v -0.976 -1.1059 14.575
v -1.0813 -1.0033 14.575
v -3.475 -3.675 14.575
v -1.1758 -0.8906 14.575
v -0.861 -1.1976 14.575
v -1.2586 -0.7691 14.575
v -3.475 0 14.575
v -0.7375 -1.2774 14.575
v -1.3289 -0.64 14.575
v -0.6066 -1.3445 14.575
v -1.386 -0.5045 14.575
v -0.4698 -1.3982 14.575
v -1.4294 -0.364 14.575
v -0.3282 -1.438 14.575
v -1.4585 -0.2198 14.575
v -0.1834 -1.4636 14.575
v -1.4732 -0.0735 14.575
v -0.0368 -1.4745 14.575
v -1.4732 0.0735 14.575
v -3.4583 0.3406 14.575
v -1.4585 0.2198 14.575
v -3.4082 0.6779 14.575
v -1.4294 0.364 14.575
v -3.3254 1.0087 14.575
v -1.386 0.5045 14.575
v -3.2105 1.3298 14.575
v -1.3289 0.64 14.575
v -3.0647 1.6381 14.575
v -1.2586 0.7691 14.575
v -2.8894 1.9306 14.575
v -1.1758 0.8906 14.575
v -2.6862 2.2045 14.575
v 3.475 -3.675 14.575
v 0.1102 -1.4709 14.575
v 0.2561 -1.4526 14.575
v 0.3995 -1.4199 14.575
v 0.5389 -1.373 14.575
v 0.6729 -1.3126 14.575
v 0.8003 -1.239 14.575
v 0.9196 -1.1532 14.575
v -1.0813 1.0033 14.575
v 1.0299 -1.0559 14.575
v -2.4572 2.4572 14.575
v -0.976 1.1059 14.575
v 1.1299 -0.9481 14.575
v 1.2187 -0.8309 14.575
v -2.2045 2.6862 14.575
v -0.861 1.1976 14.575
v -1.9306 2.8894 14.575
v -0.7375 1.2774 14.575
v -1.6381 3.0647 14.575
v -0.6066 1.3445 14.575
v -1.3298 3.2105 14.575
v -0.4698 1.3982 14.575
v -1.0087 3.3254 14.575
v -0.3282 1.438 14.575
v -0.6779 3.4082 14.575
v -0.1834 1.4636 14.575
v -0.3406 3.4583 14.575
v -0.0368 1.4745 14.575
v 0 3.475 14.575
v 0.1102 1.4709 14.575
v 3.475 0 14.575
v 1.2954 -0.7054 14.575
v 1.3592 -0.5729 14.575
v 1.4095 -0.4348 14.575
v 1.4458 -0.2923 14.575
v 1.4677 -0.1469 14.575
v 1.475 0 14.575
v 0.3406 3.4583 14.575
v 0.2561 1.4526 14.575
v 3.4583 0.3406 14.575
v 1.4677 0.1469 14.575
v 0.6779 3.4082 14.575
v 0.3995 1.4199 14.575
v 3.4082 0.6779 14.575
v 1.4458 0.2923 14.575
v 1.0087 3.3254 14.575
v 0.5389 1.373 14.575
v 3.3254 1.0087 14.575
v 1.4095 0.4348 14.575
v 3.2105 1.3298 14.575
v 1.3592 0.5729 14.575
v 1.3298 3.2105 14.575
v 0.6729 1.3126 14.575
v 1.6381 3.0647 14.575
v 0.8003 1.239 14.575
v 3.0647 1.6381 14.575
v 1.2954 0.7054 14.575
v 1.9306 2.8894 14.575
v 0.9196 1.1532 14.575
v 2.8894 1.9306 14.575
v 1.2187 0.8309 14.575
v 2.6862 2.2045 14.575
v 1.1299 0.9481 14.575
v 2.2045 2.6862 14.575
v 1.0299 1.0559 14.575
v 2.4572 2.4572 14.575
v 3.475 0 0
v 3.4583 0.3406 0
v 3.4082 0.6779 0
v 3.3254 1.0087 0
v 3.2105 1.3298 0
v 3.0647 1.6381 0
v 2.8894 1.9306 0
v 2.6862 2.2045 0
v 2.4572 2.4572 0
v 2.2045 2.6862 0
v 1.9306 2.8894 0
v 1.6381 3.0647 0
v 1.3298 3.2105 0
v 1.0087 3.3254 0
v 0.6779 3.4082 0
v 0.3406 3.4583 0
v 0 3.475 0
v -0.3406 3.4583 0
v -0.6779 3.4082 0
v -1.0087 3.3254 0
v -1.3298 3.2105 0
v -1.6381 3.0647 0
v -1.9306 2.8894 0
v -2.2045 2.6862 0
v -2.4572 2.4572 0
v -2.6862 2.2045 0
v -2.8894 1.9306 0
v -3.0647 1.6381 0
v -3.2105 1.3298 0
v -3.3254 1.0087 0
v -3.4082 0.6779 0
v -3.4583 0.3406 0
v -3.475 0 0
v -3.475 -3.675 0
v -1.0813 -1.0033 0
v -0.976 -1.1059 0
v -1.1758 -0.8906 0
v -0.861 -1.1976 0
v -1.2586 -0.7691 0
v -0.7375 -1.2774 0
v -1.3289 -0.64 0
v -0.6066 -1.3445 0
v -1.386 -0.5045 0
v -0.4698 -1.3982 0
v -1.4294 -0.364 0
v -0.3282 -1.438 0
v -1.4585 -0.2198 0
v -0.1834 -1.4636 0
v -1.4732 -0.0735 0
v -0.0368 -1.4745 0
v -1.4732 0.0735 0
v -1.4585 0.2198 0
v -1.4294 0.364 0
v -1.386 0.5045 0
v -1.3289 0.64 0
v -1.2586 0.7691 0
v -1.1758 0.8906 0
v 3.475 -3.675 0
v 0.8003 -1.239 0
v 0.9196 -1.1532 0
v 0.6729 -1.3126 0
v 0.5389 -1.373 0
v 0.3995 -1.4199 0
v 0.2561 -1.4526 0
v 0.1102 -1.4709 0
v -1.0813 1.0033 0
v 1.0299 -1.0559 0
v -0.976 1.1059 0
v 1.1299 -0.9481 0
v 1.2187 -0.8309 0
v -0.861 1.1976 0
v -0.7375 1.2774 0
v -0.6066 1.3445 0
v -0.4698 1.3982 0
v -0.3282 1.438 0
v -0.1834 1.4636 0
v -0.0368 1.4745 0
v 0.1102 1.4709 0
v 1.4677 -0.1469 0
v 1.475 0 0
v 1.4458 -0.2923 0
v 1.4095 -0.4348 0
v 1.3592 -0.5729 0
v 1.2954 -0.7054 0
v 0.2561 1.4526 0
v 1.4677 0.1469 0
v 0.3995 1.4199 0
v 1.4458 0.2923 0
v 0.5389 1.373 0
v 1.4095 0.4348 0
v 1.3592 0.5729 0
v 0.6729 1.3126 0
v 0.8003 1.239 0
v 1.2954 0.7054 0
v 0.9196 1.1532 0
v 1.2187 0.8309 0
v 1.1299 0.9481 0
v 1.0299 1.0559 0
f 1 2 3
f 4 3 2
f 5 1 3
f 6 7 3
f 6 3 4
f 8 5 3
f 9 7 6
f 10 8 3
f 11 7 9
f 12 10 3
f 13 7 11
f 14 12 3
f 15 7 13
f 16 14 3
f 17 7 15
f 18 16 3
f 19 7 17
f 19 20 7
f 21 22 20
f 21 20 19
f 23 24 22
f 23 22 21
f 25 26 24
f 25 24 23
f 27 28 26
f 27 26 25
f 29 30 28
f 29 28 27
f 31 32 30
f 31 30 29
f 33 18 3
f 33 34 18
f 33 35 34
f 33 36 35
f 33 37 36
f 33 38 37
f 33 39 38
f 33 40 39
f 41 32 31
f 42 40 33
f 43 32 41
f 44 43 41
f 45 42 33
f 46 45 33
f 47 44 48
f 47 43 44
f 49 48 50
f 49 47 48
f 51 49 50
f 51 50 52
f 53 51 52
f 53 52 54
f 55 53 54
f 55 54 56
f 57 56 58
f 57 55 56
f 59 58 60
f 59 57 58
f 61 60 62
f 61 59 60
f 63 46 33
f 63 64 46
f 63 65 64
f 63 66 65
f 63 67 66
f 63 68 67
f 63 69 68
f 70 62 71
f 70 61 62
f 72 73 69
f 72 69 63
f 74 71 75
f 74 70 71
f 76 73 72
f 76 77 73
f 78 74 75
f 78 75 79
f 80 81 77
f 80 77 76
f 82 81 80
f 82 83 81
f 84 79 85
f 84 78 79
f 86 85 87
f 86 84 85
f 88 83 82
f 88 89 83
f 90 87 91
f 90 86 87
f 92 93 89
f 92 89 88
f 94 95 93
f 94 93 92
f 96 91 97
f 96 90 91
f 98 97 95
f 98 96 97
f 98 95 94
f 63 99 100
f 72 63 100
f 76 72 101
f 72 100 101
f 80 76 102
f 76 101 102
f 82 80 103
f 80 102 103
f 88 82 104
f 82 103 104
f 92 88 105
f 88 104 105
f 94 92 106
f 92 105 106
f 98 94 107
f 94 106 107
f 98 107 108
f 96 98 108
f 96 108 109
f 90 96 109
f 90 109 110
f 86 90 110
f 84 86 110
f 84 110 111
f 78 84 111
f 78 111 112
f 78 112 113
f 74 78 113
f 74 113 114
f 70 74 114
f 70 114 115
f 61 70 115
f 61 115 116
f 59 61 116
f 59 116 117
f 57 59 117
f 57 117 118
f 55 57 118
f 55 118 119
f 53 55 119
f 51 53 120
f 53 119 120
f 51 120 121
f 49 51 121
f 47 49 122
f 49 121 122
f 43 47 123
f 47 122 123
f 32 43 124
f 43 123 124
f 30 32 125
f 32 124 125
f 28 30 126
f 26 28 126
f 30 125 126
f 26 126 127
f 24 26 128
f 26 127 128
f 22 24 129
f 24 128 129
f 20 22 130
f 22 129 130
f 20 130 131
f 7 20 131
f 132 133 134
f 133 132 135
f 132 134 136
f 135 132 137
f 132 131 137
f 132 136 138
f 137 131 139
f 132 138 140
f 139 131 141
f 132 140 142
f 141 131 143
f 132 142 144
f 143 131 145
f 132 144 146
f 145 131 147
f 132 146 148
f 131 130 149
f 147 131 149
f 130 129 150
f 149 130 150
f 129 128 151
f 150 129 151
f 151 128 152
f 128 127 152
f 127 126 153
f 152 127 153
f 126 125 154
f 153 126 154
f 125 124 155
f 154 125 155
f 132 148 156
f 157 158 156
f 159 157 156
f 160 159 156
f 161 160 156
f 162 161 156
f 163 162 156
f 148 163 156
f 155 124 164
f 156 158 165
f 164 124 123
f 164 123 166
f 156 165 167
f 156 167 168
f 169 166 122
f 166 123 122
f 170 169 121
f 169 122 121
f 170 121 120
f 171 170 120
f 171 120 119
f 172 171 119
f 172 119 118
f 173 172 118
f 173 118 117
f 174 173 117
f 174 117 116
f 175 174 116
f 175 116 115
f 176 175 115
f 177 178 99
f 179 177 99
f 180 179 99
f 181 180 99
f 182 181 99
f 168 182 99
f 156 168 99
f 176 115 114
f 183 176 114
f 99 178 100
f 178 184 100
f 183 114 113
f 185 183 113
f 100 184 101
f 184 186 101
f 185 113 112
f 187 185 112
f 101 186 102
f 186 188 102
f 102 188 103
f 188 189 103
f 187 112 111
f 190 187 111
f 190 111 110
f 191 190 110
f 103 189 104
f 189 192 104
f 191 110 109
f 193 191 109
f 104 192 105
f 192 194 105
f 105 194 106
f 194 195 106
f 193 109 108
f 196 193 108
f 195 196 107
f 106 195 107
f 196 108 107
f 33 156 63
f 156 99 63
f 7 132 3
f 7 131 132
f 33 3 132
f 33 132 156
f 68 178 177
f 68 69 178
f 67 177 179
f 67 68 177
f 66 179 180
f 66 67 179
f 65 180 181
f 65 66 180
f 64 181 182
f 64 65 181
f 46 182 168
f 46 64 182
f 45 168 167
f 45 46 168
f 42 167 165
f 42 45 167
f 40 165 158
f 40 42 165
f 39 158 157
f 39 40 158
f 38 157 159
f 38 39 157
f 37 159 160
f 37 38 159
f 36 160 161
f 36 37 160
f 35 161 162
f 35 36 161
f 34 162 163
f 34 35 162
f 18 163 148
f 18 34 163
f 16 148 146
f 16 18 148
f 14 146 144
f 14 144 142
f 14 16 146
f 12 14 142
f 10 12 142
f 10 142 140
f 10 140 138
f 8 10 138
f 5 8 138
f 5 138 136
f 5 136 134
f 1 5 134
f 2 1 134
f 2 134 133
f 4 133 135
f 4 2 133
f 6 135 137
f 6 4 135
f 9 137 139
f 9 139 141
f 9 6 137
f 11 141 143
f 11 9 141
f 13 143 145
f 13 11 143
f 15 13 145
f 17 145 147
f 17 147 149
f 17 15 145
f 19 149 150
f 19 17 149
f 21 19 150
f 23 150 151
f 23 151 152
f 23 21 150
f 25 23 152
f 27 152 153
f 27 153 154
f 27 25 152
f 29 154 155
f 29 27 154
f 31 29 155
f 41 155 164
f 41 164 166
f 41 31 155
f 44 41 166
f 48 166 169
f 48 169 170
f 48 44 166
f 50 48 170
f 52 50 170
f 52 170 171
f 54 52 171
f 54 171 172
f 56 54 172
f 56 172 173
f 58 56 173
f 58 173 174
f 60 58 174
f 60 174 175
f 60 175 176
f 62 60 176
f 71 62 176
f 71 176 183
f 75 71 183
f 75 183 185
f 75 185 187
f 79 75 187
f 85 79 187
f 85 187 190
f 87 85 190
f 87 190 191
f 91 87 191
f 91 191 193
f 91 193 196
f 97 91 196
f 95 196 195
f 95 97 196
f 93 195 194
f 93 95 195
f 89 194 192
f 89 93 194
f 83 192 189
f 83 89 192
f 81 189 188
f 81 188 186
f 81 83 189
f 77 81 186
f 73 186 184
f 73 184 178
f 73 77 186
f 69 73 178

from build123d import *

# Parameters (mm, degrees)
SKETCH2_R           = 3.475
BOSS_EXTRUDE2_DEPTH = 14.575
SKETCH3_R           = 1.475
CUT_EXTRUDE1_DEPTH  = 10
CUT_EXTRUDE2_START  = -10
SKETCH4_R           = 1.475
CUT_EXTRUDE2_DEPTH  = 10
BOSS_EXTRUDE3_DEPTH = 14.575
SKETCH6_W           = 6.95
SKETCH6_H           = 14.575
BOSS_EXTRUDE4_DEPTH = 0.2


with BuildPart() as part:
    # Sketch2 → Boss-Extrude2 (new body)
    with BuildSketch(Plane.XY):
        Circle(SKETCH2_R)
    extrude(amount=BOSS_EXTRUDE2_DEPTH)

    # Sketch3 → Cut-Extrude1 (cut)
    with BuildSketch(Plane.XY.offset(14.575)):
        Circle(SKETCH3_R)
    extrude(amount=-CUT_EXTRUDE1_DEPTH, mode=Mode.SUBTRACT)

    # Sketch4 → Cut-Extrude2 (cut)
    with BuildSketch(Plane(origin=(0, 0, 0), x_dir=(-1, 0, 0), z_dir=(0, 0, -1)).offset(CUT_EXTRUDE2_START)):
        with Locations(Location((0, 0, 0), (0, 0, 180))):
            Circle(SKETCH4_R)
    extrude(amount=CUT_EXTRUDE2_DEPTH, mode=Mode.SUBTRACT)

    # Sketch5 → Boss-Extrude3 (add)
    with BuildSketch(Plane(origin=(0, 0, 0), x_dir=(-1, 0, 0), z_dir=(0, 0, -1))):
        with BuildLine():
            ThreePointArc((0, -3.475), (-2.457196065, -2.457196065), (-3.475, 0))
            Line((-3.475, 0), (-3.475, -3.475))
            Line((-3.475, -3.475), (0, -3.475))
        make_face()
        with BuildLine():
            Line((3.475, -3.475), (3.475, 0))
            ThreePointArc((3.475, 0), (2.457196065, -2.457196065), (0, -3.475))
            Line((0, -3.475), (3.475, -3.475))
        make_face()
    extrude(amount=-BOSS_EXTRUDE3_DEPTH)

    # Sketch6 → Boss-Extrude4 (add)
    with BuildSketch(Plane.XZ.offset(3.475)):
        with Locations((0, 7.2875)):
            Rectangle(SKETCH6_W, SKETCH6_H)
    extrude(amount=BOSS_EXTRUDE4_DEPTH)


solid = part.part
